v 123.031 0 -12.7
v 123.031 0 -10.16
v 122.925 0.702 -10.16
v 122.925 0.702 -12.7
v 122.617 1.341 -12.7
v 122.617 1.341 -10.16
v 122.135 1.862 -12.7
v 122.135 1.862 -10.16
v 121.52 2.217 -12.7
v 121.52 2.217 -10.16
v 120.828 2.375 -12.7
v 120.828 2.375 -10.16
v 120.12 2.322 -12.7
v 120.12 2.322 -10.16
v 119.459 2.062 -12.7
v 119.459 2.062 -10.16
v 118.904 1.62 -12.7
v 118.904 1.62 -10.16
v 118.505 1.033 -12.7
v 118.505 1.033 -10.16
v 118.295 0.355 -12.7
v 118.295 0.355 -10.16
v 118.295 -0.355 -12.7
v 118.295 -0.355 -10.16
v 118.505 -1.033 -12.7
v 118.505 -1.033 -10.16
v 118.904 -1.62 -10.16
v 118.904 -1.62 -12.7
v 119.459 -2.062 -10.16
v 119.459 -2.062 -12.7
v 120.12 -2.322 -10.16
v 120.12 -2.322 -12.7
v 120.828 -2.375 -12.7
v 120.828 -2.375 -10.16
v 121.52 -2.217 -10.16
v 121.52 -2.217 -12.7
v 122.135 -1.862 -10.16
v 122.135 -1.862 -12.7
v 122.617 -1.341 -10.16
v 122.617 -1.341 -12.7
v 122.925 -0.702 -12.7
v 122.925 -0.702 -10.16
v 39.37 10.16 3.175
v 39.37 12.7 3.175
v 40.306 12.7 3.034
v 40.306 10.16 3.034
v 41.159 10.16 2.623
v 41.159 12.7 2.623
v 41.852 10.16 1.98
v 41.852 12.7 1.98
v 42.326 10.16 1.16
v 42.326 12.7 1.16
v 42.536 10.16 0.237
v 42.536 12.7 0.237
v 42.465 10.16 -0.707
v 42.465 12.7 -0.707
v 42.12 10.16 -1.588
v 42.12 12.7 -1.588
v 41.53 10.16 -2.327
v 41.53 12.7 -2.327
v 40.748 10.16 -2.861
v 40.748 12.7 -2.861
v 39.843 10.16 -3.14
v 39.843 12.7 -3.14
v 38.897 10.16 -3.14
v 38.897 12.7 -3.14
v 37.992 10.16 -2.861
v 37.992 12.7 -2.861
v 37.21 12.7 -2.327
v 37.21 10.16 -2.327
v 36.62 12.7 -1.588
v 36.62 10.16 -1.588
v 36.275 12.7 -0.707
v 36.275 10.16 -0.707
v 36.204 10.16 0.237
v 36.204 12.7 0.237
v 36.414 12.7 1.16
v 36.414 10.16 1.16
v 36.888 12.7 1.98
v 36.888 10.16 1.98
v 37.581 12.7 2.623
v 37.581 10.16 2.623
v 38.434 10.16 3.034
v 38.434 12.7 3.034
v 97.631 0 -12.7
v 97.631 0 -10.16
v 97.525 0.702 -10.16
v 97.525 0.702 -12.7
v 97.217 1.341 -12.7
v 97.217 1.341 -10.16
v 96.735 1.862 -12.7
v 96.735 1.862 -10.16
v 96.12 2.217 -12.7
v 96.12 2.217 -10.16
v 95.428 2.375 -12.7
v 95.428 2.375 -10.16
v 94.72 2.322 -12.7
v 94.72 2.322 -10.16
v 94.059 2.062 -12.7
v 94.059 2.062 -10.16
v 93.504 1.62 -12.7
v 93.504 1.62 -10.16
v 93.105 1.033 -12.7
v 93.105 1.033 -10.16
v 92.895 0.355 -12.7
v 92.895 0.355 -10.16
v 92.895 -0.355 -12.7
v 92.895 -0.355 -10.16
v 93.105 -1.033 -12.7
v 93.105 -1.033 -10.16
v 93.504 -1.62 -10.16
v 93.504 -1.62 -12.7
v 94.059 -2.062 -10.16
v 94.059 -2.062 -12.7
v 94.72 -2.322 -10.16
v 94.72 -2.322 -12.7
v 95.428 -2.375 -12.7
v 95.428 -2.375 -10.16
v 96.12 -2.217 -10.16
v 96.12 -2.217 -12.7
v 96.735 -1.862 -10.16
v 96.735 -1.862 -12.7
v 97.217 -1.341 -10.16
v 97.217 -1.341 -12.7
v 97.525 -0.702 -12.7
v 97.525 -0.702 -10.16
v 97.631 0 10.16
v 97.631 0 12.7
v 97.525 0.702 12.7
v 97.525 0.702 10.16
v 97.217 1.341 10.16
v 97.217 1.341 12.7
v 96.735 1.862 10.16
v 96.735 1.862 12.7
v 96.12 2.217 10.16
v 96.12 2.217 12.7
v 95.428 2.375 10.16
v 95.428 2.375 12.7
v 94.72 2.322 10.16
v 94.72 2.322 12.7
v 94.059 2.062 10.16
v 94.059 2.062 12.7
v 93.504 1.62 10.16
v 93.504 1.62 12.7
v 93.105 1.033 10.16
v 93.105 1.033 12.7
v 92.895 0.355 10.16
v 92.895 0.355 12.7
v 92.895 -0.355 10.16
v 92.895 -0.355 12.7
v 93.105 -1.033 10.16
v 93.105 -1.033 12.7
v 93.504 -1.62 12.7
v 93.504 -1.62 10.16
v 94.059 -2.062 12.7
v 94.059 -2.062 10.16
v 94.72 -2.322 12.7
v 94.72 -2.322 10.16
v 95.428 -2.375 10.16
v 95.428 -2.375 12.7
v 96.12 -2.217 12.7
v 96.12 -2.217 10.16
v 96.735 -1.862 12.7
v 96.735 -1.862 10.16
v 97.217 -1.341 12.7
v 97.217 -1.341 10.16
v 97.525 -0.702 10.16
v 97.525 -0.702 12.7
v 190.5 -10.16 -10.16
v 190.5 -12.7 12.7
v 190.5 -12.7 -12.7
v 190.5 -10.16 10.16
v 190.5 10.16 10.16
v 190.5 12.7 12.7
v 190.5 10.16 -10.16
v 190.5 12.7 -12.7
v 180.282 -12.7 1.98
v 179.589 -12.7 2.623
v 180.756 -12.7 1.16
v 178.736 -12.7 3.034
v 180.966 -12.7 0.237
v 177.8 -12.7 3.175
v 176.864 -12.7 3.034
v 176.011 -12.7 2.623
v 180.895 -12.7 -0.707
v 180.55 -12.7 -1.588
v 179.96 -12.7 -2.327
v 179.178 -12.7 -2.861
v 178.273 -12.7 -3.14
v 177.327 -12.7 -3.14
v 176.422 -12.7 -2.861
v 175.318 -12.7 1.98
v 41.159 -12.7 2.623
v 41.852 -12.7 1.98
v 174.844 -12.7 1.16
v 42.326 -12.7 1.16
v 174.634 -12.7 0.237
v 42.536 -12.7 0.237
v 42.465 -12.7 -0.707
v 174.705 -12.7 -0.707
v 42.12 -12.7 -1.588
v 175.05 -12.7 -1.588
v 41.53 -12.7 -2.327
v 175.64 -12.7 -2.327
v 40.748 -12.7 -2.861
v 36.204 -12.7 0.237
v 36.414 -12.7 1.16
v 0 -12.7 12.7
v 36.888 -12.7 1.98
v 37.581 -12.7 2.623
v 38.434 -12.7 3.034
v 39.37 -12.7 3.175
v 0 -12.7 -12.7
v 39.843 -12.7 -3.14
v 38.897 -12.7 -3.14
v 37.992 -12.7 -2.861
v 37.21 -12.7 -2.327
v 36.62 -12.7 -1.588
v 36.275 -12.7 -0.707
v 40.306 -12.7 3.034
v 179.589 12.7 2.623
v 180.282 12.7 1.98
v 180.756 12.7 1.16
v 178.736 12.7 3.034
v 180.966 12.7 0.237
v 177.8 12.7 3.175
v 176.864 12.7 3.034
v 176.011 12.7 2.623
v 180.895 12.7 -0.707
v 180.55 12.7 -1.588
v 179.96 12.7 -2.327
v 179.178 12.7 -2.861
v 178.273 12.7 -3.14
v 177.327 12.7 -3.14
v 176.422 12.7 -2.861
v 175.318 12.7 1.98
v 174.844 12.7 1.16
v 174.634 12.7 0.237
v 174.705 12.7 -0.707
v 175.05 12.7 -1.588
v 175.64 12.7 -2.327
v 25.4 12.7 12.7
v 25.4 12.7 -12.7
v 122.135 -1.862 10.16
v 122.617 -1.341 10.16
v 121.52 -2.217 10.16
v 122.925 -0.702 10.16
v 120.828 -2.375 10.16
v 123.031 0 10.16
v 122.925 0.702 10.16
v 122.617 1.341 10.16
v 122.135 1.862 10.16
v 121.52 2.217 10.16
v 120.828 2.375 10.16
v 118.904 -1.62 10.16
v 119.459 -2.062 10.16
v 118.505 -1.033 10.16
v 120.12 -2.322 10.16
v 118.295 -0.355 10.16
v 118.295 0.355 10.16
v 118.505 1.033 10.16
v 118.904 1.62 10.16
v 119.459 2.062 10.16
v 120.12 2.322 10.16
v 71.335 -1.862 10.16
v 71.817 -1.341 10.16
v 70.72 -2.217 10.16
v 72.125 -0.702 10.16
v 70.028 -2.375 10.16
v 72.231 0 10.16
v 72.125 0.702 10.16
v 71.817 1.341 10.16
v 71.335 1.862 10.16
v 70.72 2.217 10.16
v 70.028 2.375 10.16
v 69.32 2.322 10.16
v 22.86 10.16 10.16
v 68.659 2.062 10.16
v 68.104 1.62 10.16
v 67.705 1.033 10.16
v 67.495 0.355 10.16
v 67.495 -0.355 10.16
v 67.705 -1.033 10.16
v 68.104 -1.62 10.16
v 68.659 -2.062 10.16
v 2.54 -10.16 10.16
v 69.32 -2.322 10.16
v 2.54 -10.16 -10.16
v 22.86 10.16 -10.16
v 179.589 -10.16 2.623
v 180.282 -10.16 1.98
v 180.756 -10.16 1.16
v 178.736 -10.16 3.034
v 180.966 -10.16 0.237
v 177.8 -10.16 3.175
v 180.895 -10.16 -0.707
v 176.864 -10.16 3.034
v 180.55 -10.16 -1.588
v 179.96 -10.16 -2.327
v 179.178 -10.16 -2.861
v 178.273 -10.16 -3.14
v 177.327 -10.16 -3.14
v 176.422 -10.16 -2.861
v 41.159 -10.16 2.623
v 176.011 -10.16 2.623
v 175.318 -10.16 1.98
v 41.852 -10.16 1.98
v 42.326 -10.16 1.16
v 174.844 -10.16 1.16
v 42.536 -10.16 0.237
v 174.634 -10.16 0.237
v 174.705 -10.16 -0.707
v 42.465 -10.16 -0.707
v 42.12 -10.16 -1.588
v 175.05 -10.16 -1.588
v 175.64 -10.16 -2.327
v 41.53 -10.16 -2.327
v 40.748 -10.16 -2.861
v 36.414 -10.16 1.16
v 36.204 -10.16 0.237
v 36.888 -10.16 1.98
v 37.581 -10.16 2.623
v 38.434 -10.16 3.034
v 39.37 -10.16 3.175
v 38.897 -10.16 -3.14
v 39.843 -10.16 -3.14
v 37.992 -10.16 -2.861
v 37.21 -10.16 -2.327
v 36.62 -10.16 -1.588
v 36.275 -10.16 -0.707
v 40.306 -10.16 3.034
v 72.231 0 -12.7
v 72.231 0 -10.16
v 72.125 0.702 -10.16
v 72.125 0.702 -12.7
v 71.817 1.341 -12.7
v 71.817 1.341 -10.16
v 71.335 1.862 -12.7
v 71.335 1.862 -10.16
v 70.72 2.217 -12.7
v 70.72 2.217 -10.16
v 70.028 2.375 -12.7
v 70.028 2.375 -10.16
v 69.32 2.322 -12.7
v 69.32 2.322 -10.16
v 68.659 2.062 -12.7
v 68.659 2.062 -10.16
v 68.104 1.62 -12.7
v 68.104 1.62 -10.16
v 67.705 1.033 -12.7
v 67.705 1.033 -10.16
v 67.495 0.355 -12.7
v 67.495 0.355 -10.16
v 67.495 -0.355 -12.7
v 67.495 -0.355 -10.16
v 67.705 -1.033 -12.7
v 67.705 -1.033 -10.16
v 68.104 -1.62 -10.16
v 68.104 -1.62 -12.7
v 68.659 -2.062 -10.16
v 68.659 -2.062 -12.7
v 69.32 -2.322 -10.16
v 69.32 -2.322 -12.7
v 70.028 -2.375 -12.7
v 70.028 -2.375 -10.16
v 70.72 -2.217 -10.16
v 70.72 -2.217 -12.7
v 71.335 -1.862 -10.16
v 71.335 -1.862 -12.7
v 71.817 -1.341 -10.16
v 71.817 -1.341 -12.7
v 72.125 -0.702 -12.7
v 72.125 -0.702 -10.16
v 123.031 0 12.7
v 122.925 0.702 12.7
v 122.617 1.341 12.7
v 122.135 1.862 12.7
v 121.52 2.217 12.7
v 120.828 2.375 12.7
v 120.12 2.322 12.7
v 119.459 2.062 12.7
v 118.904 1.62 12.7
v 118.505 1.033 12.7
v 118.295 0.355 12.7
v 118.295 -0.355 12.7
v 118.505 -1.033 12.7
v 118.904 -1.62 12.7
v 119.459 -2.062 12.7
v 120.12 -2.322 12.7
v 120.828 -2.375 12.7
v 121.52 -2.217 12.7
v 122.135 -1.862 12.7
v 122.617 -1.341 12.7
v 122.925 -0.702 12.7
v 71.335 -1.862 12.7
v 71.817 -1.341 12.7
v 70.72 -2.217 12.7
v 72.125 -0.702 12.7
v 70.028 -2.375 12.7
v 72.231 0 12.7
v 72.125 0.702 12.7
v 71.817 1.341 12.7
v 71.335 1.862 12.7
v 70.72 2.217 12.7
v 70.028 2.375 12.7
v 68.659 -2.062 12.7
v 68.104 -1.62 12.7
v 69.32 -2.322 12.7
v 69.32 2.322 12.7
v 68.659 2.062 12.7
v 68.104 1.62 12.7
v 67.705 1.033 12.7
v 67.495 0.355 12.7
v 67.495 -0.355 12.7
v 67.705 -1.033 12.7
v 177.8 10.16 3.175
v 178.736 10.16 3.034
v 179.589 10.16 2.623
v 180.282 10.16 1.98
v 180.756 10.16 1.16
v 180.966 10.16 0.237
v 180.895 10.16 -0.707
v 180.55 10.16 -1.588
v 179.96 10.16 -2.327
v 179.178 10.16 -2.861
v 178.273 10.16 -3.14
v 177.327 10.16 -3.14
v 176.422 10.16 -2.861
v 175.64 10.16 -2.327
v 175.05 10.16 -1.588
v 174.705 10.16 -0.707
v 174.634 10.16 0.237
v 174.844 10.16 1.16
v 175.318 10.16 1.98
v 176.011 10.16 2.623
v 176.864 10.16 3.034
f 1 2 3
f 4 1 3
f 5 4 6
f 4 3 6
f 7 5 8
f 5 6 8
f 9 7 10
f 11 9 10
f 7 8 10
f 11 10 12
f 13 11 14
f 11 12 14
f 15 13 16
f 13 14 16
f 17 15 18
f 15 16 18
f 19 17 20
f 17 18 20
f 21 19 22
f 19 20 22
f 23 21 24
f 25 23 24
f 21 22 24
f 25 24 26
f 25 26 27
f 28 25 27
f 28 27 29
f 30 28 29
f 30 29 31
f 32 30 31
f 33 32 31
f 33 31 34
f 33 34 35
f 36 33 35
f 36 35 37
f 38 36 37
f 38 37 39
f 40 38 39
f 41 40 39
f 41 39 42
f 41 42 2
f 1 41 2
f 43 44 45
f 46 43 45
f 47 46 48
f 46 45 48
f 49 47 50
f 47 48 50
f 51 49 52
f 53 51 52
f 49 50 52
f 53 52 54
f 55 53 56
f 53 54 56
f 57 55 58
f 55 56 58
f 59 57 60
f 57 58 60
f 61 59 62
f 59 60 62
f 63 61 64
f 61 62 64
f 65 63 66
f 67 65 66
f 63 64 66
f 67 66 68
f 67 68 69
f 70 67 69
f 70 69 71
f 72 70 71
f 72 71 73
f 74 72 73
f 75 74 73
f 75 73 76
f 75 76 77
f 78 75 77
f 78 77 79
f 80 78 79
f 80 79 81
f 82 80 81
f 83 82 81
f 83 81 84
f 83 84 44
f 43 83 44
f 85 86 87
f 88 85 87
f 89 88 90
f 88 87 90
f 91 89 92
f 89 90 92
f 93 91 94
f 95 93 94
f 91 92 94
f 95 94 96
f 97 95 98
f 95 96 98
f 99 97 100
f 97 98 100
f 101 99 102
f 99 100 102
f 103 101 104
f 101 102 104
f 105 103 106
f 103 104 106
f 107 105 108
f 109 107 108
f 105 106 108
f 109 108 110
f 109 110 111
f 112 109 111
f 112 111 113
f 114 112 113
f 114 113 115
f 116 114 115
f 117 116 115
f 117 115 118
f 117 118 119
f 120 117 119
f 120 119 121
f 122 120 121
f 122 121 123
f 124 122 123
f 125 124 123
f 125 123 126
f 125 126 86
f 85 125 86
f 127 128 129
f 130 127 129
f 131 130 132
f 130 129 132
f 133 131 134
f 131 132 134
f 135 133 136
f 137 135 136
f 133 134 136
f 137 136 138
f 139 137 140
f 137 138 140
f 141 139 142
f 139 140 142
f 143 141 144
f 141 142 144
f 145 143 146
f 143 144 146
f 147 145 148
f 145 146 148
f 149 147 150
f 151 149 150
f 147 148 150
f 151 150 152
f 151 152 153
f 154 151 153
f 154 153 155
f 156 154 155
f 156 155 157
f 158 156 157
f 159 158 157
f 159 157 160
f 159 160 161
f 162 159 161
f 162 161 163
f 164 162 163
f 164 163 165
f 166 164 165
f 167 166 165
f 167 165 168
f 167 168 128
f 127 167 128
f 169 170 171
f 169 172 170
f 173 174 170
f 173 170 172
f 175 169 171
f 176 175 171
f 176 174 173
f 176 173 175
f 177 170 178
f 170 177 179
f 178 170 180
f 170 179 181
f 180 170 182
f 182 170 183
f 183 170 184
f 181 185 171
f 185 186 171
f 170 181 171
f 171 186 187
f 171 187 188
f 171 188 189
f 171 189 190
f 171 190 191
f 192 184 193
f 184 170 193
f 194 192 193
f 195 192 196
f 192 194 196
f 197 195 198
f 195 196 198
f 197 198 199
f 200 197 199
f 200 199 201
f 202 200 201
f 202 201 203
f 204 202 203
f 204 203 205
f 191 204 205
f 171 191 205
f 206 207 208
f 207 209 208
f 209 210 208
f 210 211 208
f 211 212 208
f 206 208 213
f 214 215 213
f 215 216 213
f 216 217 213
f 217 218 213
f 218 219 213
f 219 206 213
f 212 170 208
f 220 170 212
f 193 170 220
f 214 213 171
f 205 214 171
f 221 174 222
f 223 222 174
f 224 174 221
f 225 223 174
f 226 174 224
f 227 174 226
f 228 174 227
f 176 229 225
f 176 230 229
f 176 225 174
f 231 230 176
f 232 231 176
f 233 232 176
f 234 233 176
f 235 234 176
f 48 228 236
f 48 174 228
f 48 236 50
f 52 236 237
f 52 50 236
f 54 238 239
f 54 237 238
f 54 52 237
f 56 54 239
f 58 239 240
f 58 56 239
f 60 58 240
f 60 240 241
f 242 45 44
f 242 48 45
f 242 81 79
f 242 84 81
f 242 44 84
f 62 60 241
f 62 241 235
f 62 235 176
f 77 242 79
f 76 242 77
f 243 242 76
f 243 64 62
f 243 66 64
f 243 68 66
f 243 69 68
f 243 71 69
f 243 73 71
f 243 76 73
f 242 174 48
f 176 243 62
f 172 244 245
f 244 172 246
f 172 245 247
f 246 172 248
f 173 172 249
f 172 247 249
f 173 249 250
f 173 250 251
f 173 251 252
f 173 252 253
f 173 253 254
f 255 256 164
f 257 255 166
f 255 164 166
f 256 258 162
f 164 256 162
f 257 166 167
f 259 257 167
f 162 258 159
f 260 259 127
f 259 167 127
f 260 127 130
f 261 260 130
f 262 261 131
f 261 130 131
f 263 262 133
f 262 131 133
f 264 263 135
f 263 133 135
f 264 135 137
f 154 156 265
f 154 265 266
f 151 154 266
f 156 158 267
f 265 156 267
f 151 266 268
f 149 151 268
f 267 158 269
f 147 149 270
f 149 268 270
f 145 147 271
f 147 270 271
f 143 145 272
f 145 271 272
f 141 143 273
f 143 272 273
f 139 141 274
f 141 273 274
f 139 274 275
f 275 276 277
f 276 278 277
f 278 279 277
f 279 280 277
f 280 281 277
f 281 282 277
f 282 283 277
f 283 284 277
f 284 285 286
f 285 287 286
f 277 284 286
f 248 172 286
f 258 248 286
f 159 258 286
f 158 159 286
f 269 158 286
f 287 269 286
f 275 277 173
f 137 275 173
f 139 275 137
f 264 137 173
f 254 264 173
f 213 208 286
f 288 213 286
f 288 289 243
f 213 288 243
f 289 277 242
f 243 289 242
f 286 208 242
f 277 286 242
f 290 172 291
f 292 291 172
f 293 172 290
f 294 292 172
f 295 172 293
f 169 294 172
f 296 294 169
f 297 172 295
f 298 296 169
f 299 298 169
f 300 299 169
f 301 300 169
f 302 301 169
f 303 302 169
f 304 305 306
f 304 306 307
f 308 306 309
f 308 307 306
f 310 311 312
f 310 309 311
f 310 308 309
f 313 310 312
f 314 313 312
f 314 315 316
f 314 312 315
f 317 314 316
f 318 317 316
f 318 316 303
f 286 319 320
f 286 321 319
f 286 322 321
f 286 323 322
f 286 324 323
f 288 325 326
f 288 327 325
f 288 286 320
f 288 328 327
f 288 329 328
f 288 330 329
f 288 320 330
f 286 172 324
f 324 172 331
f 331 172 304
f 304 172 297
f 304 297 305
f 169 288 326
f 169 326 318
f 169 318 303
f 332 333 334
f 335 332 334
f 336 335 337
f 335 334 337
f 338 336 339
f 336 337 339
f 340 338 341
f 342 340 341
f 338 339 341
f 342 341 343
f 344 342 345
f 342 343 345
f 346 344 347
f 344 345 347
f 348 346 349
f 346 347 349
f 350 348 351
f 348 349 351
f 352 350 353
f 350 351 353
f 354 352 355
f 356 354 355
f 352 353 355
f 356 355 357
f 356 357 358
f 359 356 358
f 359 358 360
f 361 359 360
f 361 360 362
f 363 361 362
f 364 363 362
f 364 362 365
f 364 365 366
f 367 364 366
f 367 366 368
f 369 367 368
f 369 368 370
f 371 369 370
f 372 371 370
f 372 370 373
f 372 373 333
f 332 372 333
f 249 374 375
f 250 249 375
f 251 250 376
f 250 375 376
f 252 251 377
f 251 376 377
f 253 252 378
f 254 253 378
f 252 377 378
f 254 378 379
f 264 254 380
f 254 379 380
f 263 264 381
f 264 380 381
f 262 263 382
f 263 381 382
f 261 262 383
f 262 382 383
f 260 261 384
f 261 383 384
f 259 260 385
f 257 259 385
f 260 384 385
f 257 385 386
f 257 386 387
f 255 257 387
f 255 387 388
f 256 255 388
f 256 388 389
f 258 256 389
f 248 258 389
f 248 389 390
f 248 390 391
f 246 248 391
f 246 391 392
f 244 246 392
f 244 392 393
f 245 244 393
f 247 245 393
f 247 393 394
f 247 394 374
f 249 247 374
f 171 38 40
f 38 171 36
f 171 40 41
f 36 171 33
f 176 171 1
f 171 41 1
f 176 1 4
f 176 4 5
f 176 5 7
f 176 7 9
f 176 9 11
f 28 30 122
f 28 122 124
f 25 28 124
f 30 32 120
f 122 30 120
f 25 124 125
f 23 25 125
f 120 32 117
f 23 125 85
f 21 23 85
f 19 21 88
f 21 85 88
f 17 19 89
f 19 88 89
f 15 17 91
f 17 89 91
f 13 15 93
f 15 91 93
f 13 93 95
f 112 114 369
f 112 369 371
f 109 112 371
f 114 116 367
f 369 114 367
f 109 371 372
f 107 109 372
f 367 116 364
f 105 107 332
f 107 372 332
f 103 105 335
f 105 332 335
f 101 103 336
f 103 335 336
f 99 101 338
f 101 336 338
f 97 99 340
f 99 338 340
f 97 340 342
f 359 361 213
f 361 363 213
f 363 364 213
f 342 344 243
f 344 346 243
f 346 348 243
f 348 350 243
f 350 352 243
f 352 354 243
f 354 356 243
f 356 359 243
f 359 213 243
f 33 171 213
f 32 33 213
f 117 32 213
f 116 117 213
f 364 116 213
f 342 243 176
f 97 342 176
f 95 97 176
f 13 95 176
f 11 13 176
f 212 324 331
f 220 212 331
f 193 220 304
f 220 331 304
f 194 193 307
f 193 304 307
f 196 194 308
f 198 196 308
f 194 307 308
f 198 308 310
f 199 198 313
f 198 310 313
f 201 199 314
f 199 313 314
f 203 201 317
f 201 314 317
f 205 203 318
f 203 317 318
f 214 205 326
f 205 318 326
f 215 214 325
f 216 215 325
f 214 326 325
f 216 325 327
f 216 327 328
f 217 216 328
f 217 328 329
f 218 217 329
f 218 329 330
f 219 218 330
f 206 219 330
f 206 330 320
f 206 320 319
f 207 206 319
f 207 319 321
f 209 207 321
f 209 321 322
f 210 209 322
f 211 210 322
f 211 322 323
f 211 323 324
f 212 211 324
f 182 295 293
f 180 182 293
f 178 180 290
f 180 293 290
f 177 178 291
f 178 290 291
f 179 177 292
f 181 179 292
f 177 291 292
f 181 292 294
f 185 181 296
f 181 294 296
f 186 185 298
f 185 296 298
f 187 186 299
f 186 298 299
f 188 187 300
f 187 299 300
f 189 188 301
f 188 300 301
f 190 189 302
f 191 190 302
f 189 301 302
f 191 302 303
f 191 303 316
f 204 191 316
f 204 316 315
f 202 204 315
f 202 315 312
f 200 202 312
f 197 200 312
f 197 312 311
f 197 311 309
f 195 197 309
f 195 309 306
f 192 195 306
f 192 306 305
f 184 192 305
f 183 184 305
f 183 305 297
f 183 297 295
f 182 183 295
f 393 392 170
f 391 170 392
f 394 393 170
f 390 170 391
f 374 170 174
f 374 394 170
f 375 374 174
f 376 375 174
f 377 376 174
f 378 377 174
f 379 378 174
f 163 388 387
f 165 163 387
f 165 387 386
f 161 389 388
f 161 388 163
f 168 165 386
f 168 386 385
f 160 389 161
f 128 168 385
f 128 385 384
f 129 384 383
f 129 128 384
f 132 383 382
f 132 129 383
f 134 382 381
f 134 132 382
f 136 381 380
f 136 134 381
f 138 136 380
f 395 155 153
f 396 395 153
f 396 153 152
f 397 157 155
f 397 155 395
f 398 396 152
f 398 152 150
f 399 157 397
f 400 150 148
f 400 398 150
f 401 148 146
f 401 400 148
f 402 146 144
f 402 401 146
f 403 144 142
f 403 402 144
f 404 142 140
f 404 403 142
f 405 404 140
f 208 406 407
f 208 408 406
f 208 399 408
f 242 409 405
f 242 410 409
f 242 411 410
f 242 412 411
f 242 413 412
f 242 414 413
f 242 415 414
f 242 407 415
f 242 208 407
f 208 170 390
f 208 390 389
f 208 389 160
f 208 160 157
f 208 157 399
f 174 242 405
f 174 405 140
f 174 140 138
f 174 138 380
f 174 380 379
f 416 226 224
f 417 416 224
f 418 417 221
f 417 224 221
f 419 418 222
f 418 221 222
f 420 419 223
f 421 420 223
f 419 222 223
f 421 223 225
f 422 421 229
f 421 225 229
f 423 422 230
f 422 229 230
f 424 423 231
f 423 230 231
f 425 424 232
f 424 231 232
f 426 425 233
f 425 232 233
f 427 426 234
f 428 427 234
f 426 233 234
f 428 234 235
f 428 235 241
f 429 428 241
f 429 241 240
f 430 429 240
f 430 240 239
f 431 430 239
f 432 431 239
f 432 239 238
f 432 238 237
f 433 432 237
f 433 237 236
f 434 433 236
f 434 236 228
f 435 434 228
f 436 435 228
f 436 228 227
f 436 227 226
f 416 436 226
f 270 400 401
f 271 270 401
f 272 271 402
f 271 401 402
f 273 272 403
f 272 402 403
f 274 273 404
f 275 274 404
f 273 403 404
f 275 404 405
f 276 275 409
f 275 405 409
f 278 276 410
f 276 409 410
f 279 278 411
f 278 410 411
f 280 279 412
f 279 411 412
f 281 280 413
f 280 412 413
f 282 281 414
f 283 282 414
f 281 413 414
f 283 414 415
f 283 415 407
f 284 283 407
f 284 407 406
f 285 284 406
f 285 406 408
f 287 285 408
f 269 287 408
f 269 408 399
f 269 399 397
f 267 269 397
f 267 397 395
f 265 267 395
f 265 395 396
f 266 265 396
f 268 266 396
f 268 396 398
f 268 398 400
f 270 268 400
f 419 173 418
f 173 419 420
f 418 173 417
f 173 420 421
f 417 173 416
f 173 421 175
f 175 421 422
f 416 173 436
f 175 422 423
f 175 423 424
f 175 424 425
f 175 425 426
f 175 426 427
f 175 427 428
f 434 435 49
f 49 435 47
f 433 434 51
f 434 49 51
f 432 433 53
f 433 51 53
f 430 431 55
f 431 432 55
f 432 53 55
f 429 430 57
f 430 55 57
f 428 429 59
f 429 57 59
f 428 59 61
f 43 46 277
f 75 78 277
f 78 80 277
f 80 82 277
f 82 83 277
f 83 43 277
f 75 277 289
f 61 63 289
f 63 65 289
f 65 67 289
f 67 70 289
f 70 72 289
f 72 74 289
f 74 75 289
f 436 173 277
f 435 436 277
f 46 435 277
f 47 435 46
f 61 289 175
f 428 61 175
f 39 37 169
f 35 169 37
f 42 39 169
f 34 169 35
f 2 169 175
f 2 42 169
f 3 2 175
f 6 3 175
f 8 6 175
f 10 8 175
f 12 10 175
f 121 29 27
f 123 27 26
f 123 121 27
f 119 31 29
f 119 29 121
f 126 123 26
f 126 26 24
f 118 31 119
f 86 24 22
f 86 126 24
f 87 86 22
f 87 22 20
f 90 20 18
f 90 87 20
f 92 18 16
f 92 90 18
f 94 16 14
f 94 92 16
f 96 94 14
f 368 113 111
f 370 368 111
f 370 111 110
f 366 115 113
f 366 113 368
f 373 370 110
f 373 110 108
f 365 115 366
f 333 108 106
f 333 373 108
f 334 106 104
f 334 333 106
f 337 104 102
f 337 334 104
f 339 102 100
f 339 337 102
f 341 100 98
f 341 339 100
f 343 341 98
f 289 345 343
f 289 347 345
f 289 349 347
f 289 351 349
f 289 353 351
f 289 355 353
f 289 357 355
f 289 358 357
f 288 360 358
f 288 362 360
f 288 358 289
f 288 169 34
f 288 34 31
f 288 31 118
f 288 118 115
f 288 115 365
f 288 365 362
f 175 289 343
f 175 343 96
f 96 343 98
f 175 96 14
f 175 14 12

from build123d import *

# Parameters (mm, degrees)
SKETCH1_W           = 25.4
SKETCH1_H           = 25.4
SKETCH1_W_2         = 20.32
SKETCH1_H_2         = 20.32
BOSS_EXTRUDE1_DEPTH = 190.5
CUT_EXTRUDE1_DEPTH  = 193.605036279
SKETCH3_R           = 3.175
CUT_EXTRUDE2_DEPTH  = 193.605036279
SKETCH4_R           = 2.38125
CUT_EXTRUDE3_DEPTH  = 193.605036279


with BuildPart() as part:
    # Sketch1 → Boss-Extrude1 (new body)
    with BuildSketch(Plane(origin=(0, 0, 0), x_dir=(0, 0, -1), z_dir=(1, 0, 0))):
        Rectangle(SKETCH1_W, SKETCH1_H)
        Rectangle(SKETCH1_W_2, SKETCH1_H_2, mode=Mode.SUBTRACT)
    extrude(amount=BOSS_EXTRUDE1_DEPTH)

    # Sketch2 → Cut-Extrude1 (cut, through all)
    with BuildSketch(Plane.XY.offset(12.7)):
        Polygon((0, -12.7), (25.4, 12.7), (0, 12.7), align=None)
    extrude(amount=-CUT_EXTRUDE1_DEPTH, mode=Mode.SUBTRACT)

    # Sketch3 → Cut-Extrude2 (cut, through all)
    with BuildSketch(Plane(origin=(0, 12.7, 0), x_dir=(1, 0, 0), z_dir=(0, 1, 0))):
        with Locations(Location((177.8, 0, 0), (0, 0, 270))):
            Circle(SKETCH3_R)
        with Locations(Location((39.37, 0, 0), (0, 0, 270))):
            Circle(SKETCH3_R)
    extrude(amount=-CUT_EXTRUDE2_DEPTH, mode=Mode.SUBTRACT)

    # Sketch4 → Cut-Extrude3 (cut, through all)
    with BuildSketch(Plane.XY.offset(12.7)):
        with Locations((95.25, 0)):
            Circle(SKETCH4_R)
        with Locations((120.65, 0)):
            Circle(SKETCH4_R)
        with Locations((69.85, 0)):
            Circle(SKETCH4_R)
    extrude(amount=-CUT_EXTRUDE3_DEPTH, mode=Mode.SUBTRACT)


solid = part.part
